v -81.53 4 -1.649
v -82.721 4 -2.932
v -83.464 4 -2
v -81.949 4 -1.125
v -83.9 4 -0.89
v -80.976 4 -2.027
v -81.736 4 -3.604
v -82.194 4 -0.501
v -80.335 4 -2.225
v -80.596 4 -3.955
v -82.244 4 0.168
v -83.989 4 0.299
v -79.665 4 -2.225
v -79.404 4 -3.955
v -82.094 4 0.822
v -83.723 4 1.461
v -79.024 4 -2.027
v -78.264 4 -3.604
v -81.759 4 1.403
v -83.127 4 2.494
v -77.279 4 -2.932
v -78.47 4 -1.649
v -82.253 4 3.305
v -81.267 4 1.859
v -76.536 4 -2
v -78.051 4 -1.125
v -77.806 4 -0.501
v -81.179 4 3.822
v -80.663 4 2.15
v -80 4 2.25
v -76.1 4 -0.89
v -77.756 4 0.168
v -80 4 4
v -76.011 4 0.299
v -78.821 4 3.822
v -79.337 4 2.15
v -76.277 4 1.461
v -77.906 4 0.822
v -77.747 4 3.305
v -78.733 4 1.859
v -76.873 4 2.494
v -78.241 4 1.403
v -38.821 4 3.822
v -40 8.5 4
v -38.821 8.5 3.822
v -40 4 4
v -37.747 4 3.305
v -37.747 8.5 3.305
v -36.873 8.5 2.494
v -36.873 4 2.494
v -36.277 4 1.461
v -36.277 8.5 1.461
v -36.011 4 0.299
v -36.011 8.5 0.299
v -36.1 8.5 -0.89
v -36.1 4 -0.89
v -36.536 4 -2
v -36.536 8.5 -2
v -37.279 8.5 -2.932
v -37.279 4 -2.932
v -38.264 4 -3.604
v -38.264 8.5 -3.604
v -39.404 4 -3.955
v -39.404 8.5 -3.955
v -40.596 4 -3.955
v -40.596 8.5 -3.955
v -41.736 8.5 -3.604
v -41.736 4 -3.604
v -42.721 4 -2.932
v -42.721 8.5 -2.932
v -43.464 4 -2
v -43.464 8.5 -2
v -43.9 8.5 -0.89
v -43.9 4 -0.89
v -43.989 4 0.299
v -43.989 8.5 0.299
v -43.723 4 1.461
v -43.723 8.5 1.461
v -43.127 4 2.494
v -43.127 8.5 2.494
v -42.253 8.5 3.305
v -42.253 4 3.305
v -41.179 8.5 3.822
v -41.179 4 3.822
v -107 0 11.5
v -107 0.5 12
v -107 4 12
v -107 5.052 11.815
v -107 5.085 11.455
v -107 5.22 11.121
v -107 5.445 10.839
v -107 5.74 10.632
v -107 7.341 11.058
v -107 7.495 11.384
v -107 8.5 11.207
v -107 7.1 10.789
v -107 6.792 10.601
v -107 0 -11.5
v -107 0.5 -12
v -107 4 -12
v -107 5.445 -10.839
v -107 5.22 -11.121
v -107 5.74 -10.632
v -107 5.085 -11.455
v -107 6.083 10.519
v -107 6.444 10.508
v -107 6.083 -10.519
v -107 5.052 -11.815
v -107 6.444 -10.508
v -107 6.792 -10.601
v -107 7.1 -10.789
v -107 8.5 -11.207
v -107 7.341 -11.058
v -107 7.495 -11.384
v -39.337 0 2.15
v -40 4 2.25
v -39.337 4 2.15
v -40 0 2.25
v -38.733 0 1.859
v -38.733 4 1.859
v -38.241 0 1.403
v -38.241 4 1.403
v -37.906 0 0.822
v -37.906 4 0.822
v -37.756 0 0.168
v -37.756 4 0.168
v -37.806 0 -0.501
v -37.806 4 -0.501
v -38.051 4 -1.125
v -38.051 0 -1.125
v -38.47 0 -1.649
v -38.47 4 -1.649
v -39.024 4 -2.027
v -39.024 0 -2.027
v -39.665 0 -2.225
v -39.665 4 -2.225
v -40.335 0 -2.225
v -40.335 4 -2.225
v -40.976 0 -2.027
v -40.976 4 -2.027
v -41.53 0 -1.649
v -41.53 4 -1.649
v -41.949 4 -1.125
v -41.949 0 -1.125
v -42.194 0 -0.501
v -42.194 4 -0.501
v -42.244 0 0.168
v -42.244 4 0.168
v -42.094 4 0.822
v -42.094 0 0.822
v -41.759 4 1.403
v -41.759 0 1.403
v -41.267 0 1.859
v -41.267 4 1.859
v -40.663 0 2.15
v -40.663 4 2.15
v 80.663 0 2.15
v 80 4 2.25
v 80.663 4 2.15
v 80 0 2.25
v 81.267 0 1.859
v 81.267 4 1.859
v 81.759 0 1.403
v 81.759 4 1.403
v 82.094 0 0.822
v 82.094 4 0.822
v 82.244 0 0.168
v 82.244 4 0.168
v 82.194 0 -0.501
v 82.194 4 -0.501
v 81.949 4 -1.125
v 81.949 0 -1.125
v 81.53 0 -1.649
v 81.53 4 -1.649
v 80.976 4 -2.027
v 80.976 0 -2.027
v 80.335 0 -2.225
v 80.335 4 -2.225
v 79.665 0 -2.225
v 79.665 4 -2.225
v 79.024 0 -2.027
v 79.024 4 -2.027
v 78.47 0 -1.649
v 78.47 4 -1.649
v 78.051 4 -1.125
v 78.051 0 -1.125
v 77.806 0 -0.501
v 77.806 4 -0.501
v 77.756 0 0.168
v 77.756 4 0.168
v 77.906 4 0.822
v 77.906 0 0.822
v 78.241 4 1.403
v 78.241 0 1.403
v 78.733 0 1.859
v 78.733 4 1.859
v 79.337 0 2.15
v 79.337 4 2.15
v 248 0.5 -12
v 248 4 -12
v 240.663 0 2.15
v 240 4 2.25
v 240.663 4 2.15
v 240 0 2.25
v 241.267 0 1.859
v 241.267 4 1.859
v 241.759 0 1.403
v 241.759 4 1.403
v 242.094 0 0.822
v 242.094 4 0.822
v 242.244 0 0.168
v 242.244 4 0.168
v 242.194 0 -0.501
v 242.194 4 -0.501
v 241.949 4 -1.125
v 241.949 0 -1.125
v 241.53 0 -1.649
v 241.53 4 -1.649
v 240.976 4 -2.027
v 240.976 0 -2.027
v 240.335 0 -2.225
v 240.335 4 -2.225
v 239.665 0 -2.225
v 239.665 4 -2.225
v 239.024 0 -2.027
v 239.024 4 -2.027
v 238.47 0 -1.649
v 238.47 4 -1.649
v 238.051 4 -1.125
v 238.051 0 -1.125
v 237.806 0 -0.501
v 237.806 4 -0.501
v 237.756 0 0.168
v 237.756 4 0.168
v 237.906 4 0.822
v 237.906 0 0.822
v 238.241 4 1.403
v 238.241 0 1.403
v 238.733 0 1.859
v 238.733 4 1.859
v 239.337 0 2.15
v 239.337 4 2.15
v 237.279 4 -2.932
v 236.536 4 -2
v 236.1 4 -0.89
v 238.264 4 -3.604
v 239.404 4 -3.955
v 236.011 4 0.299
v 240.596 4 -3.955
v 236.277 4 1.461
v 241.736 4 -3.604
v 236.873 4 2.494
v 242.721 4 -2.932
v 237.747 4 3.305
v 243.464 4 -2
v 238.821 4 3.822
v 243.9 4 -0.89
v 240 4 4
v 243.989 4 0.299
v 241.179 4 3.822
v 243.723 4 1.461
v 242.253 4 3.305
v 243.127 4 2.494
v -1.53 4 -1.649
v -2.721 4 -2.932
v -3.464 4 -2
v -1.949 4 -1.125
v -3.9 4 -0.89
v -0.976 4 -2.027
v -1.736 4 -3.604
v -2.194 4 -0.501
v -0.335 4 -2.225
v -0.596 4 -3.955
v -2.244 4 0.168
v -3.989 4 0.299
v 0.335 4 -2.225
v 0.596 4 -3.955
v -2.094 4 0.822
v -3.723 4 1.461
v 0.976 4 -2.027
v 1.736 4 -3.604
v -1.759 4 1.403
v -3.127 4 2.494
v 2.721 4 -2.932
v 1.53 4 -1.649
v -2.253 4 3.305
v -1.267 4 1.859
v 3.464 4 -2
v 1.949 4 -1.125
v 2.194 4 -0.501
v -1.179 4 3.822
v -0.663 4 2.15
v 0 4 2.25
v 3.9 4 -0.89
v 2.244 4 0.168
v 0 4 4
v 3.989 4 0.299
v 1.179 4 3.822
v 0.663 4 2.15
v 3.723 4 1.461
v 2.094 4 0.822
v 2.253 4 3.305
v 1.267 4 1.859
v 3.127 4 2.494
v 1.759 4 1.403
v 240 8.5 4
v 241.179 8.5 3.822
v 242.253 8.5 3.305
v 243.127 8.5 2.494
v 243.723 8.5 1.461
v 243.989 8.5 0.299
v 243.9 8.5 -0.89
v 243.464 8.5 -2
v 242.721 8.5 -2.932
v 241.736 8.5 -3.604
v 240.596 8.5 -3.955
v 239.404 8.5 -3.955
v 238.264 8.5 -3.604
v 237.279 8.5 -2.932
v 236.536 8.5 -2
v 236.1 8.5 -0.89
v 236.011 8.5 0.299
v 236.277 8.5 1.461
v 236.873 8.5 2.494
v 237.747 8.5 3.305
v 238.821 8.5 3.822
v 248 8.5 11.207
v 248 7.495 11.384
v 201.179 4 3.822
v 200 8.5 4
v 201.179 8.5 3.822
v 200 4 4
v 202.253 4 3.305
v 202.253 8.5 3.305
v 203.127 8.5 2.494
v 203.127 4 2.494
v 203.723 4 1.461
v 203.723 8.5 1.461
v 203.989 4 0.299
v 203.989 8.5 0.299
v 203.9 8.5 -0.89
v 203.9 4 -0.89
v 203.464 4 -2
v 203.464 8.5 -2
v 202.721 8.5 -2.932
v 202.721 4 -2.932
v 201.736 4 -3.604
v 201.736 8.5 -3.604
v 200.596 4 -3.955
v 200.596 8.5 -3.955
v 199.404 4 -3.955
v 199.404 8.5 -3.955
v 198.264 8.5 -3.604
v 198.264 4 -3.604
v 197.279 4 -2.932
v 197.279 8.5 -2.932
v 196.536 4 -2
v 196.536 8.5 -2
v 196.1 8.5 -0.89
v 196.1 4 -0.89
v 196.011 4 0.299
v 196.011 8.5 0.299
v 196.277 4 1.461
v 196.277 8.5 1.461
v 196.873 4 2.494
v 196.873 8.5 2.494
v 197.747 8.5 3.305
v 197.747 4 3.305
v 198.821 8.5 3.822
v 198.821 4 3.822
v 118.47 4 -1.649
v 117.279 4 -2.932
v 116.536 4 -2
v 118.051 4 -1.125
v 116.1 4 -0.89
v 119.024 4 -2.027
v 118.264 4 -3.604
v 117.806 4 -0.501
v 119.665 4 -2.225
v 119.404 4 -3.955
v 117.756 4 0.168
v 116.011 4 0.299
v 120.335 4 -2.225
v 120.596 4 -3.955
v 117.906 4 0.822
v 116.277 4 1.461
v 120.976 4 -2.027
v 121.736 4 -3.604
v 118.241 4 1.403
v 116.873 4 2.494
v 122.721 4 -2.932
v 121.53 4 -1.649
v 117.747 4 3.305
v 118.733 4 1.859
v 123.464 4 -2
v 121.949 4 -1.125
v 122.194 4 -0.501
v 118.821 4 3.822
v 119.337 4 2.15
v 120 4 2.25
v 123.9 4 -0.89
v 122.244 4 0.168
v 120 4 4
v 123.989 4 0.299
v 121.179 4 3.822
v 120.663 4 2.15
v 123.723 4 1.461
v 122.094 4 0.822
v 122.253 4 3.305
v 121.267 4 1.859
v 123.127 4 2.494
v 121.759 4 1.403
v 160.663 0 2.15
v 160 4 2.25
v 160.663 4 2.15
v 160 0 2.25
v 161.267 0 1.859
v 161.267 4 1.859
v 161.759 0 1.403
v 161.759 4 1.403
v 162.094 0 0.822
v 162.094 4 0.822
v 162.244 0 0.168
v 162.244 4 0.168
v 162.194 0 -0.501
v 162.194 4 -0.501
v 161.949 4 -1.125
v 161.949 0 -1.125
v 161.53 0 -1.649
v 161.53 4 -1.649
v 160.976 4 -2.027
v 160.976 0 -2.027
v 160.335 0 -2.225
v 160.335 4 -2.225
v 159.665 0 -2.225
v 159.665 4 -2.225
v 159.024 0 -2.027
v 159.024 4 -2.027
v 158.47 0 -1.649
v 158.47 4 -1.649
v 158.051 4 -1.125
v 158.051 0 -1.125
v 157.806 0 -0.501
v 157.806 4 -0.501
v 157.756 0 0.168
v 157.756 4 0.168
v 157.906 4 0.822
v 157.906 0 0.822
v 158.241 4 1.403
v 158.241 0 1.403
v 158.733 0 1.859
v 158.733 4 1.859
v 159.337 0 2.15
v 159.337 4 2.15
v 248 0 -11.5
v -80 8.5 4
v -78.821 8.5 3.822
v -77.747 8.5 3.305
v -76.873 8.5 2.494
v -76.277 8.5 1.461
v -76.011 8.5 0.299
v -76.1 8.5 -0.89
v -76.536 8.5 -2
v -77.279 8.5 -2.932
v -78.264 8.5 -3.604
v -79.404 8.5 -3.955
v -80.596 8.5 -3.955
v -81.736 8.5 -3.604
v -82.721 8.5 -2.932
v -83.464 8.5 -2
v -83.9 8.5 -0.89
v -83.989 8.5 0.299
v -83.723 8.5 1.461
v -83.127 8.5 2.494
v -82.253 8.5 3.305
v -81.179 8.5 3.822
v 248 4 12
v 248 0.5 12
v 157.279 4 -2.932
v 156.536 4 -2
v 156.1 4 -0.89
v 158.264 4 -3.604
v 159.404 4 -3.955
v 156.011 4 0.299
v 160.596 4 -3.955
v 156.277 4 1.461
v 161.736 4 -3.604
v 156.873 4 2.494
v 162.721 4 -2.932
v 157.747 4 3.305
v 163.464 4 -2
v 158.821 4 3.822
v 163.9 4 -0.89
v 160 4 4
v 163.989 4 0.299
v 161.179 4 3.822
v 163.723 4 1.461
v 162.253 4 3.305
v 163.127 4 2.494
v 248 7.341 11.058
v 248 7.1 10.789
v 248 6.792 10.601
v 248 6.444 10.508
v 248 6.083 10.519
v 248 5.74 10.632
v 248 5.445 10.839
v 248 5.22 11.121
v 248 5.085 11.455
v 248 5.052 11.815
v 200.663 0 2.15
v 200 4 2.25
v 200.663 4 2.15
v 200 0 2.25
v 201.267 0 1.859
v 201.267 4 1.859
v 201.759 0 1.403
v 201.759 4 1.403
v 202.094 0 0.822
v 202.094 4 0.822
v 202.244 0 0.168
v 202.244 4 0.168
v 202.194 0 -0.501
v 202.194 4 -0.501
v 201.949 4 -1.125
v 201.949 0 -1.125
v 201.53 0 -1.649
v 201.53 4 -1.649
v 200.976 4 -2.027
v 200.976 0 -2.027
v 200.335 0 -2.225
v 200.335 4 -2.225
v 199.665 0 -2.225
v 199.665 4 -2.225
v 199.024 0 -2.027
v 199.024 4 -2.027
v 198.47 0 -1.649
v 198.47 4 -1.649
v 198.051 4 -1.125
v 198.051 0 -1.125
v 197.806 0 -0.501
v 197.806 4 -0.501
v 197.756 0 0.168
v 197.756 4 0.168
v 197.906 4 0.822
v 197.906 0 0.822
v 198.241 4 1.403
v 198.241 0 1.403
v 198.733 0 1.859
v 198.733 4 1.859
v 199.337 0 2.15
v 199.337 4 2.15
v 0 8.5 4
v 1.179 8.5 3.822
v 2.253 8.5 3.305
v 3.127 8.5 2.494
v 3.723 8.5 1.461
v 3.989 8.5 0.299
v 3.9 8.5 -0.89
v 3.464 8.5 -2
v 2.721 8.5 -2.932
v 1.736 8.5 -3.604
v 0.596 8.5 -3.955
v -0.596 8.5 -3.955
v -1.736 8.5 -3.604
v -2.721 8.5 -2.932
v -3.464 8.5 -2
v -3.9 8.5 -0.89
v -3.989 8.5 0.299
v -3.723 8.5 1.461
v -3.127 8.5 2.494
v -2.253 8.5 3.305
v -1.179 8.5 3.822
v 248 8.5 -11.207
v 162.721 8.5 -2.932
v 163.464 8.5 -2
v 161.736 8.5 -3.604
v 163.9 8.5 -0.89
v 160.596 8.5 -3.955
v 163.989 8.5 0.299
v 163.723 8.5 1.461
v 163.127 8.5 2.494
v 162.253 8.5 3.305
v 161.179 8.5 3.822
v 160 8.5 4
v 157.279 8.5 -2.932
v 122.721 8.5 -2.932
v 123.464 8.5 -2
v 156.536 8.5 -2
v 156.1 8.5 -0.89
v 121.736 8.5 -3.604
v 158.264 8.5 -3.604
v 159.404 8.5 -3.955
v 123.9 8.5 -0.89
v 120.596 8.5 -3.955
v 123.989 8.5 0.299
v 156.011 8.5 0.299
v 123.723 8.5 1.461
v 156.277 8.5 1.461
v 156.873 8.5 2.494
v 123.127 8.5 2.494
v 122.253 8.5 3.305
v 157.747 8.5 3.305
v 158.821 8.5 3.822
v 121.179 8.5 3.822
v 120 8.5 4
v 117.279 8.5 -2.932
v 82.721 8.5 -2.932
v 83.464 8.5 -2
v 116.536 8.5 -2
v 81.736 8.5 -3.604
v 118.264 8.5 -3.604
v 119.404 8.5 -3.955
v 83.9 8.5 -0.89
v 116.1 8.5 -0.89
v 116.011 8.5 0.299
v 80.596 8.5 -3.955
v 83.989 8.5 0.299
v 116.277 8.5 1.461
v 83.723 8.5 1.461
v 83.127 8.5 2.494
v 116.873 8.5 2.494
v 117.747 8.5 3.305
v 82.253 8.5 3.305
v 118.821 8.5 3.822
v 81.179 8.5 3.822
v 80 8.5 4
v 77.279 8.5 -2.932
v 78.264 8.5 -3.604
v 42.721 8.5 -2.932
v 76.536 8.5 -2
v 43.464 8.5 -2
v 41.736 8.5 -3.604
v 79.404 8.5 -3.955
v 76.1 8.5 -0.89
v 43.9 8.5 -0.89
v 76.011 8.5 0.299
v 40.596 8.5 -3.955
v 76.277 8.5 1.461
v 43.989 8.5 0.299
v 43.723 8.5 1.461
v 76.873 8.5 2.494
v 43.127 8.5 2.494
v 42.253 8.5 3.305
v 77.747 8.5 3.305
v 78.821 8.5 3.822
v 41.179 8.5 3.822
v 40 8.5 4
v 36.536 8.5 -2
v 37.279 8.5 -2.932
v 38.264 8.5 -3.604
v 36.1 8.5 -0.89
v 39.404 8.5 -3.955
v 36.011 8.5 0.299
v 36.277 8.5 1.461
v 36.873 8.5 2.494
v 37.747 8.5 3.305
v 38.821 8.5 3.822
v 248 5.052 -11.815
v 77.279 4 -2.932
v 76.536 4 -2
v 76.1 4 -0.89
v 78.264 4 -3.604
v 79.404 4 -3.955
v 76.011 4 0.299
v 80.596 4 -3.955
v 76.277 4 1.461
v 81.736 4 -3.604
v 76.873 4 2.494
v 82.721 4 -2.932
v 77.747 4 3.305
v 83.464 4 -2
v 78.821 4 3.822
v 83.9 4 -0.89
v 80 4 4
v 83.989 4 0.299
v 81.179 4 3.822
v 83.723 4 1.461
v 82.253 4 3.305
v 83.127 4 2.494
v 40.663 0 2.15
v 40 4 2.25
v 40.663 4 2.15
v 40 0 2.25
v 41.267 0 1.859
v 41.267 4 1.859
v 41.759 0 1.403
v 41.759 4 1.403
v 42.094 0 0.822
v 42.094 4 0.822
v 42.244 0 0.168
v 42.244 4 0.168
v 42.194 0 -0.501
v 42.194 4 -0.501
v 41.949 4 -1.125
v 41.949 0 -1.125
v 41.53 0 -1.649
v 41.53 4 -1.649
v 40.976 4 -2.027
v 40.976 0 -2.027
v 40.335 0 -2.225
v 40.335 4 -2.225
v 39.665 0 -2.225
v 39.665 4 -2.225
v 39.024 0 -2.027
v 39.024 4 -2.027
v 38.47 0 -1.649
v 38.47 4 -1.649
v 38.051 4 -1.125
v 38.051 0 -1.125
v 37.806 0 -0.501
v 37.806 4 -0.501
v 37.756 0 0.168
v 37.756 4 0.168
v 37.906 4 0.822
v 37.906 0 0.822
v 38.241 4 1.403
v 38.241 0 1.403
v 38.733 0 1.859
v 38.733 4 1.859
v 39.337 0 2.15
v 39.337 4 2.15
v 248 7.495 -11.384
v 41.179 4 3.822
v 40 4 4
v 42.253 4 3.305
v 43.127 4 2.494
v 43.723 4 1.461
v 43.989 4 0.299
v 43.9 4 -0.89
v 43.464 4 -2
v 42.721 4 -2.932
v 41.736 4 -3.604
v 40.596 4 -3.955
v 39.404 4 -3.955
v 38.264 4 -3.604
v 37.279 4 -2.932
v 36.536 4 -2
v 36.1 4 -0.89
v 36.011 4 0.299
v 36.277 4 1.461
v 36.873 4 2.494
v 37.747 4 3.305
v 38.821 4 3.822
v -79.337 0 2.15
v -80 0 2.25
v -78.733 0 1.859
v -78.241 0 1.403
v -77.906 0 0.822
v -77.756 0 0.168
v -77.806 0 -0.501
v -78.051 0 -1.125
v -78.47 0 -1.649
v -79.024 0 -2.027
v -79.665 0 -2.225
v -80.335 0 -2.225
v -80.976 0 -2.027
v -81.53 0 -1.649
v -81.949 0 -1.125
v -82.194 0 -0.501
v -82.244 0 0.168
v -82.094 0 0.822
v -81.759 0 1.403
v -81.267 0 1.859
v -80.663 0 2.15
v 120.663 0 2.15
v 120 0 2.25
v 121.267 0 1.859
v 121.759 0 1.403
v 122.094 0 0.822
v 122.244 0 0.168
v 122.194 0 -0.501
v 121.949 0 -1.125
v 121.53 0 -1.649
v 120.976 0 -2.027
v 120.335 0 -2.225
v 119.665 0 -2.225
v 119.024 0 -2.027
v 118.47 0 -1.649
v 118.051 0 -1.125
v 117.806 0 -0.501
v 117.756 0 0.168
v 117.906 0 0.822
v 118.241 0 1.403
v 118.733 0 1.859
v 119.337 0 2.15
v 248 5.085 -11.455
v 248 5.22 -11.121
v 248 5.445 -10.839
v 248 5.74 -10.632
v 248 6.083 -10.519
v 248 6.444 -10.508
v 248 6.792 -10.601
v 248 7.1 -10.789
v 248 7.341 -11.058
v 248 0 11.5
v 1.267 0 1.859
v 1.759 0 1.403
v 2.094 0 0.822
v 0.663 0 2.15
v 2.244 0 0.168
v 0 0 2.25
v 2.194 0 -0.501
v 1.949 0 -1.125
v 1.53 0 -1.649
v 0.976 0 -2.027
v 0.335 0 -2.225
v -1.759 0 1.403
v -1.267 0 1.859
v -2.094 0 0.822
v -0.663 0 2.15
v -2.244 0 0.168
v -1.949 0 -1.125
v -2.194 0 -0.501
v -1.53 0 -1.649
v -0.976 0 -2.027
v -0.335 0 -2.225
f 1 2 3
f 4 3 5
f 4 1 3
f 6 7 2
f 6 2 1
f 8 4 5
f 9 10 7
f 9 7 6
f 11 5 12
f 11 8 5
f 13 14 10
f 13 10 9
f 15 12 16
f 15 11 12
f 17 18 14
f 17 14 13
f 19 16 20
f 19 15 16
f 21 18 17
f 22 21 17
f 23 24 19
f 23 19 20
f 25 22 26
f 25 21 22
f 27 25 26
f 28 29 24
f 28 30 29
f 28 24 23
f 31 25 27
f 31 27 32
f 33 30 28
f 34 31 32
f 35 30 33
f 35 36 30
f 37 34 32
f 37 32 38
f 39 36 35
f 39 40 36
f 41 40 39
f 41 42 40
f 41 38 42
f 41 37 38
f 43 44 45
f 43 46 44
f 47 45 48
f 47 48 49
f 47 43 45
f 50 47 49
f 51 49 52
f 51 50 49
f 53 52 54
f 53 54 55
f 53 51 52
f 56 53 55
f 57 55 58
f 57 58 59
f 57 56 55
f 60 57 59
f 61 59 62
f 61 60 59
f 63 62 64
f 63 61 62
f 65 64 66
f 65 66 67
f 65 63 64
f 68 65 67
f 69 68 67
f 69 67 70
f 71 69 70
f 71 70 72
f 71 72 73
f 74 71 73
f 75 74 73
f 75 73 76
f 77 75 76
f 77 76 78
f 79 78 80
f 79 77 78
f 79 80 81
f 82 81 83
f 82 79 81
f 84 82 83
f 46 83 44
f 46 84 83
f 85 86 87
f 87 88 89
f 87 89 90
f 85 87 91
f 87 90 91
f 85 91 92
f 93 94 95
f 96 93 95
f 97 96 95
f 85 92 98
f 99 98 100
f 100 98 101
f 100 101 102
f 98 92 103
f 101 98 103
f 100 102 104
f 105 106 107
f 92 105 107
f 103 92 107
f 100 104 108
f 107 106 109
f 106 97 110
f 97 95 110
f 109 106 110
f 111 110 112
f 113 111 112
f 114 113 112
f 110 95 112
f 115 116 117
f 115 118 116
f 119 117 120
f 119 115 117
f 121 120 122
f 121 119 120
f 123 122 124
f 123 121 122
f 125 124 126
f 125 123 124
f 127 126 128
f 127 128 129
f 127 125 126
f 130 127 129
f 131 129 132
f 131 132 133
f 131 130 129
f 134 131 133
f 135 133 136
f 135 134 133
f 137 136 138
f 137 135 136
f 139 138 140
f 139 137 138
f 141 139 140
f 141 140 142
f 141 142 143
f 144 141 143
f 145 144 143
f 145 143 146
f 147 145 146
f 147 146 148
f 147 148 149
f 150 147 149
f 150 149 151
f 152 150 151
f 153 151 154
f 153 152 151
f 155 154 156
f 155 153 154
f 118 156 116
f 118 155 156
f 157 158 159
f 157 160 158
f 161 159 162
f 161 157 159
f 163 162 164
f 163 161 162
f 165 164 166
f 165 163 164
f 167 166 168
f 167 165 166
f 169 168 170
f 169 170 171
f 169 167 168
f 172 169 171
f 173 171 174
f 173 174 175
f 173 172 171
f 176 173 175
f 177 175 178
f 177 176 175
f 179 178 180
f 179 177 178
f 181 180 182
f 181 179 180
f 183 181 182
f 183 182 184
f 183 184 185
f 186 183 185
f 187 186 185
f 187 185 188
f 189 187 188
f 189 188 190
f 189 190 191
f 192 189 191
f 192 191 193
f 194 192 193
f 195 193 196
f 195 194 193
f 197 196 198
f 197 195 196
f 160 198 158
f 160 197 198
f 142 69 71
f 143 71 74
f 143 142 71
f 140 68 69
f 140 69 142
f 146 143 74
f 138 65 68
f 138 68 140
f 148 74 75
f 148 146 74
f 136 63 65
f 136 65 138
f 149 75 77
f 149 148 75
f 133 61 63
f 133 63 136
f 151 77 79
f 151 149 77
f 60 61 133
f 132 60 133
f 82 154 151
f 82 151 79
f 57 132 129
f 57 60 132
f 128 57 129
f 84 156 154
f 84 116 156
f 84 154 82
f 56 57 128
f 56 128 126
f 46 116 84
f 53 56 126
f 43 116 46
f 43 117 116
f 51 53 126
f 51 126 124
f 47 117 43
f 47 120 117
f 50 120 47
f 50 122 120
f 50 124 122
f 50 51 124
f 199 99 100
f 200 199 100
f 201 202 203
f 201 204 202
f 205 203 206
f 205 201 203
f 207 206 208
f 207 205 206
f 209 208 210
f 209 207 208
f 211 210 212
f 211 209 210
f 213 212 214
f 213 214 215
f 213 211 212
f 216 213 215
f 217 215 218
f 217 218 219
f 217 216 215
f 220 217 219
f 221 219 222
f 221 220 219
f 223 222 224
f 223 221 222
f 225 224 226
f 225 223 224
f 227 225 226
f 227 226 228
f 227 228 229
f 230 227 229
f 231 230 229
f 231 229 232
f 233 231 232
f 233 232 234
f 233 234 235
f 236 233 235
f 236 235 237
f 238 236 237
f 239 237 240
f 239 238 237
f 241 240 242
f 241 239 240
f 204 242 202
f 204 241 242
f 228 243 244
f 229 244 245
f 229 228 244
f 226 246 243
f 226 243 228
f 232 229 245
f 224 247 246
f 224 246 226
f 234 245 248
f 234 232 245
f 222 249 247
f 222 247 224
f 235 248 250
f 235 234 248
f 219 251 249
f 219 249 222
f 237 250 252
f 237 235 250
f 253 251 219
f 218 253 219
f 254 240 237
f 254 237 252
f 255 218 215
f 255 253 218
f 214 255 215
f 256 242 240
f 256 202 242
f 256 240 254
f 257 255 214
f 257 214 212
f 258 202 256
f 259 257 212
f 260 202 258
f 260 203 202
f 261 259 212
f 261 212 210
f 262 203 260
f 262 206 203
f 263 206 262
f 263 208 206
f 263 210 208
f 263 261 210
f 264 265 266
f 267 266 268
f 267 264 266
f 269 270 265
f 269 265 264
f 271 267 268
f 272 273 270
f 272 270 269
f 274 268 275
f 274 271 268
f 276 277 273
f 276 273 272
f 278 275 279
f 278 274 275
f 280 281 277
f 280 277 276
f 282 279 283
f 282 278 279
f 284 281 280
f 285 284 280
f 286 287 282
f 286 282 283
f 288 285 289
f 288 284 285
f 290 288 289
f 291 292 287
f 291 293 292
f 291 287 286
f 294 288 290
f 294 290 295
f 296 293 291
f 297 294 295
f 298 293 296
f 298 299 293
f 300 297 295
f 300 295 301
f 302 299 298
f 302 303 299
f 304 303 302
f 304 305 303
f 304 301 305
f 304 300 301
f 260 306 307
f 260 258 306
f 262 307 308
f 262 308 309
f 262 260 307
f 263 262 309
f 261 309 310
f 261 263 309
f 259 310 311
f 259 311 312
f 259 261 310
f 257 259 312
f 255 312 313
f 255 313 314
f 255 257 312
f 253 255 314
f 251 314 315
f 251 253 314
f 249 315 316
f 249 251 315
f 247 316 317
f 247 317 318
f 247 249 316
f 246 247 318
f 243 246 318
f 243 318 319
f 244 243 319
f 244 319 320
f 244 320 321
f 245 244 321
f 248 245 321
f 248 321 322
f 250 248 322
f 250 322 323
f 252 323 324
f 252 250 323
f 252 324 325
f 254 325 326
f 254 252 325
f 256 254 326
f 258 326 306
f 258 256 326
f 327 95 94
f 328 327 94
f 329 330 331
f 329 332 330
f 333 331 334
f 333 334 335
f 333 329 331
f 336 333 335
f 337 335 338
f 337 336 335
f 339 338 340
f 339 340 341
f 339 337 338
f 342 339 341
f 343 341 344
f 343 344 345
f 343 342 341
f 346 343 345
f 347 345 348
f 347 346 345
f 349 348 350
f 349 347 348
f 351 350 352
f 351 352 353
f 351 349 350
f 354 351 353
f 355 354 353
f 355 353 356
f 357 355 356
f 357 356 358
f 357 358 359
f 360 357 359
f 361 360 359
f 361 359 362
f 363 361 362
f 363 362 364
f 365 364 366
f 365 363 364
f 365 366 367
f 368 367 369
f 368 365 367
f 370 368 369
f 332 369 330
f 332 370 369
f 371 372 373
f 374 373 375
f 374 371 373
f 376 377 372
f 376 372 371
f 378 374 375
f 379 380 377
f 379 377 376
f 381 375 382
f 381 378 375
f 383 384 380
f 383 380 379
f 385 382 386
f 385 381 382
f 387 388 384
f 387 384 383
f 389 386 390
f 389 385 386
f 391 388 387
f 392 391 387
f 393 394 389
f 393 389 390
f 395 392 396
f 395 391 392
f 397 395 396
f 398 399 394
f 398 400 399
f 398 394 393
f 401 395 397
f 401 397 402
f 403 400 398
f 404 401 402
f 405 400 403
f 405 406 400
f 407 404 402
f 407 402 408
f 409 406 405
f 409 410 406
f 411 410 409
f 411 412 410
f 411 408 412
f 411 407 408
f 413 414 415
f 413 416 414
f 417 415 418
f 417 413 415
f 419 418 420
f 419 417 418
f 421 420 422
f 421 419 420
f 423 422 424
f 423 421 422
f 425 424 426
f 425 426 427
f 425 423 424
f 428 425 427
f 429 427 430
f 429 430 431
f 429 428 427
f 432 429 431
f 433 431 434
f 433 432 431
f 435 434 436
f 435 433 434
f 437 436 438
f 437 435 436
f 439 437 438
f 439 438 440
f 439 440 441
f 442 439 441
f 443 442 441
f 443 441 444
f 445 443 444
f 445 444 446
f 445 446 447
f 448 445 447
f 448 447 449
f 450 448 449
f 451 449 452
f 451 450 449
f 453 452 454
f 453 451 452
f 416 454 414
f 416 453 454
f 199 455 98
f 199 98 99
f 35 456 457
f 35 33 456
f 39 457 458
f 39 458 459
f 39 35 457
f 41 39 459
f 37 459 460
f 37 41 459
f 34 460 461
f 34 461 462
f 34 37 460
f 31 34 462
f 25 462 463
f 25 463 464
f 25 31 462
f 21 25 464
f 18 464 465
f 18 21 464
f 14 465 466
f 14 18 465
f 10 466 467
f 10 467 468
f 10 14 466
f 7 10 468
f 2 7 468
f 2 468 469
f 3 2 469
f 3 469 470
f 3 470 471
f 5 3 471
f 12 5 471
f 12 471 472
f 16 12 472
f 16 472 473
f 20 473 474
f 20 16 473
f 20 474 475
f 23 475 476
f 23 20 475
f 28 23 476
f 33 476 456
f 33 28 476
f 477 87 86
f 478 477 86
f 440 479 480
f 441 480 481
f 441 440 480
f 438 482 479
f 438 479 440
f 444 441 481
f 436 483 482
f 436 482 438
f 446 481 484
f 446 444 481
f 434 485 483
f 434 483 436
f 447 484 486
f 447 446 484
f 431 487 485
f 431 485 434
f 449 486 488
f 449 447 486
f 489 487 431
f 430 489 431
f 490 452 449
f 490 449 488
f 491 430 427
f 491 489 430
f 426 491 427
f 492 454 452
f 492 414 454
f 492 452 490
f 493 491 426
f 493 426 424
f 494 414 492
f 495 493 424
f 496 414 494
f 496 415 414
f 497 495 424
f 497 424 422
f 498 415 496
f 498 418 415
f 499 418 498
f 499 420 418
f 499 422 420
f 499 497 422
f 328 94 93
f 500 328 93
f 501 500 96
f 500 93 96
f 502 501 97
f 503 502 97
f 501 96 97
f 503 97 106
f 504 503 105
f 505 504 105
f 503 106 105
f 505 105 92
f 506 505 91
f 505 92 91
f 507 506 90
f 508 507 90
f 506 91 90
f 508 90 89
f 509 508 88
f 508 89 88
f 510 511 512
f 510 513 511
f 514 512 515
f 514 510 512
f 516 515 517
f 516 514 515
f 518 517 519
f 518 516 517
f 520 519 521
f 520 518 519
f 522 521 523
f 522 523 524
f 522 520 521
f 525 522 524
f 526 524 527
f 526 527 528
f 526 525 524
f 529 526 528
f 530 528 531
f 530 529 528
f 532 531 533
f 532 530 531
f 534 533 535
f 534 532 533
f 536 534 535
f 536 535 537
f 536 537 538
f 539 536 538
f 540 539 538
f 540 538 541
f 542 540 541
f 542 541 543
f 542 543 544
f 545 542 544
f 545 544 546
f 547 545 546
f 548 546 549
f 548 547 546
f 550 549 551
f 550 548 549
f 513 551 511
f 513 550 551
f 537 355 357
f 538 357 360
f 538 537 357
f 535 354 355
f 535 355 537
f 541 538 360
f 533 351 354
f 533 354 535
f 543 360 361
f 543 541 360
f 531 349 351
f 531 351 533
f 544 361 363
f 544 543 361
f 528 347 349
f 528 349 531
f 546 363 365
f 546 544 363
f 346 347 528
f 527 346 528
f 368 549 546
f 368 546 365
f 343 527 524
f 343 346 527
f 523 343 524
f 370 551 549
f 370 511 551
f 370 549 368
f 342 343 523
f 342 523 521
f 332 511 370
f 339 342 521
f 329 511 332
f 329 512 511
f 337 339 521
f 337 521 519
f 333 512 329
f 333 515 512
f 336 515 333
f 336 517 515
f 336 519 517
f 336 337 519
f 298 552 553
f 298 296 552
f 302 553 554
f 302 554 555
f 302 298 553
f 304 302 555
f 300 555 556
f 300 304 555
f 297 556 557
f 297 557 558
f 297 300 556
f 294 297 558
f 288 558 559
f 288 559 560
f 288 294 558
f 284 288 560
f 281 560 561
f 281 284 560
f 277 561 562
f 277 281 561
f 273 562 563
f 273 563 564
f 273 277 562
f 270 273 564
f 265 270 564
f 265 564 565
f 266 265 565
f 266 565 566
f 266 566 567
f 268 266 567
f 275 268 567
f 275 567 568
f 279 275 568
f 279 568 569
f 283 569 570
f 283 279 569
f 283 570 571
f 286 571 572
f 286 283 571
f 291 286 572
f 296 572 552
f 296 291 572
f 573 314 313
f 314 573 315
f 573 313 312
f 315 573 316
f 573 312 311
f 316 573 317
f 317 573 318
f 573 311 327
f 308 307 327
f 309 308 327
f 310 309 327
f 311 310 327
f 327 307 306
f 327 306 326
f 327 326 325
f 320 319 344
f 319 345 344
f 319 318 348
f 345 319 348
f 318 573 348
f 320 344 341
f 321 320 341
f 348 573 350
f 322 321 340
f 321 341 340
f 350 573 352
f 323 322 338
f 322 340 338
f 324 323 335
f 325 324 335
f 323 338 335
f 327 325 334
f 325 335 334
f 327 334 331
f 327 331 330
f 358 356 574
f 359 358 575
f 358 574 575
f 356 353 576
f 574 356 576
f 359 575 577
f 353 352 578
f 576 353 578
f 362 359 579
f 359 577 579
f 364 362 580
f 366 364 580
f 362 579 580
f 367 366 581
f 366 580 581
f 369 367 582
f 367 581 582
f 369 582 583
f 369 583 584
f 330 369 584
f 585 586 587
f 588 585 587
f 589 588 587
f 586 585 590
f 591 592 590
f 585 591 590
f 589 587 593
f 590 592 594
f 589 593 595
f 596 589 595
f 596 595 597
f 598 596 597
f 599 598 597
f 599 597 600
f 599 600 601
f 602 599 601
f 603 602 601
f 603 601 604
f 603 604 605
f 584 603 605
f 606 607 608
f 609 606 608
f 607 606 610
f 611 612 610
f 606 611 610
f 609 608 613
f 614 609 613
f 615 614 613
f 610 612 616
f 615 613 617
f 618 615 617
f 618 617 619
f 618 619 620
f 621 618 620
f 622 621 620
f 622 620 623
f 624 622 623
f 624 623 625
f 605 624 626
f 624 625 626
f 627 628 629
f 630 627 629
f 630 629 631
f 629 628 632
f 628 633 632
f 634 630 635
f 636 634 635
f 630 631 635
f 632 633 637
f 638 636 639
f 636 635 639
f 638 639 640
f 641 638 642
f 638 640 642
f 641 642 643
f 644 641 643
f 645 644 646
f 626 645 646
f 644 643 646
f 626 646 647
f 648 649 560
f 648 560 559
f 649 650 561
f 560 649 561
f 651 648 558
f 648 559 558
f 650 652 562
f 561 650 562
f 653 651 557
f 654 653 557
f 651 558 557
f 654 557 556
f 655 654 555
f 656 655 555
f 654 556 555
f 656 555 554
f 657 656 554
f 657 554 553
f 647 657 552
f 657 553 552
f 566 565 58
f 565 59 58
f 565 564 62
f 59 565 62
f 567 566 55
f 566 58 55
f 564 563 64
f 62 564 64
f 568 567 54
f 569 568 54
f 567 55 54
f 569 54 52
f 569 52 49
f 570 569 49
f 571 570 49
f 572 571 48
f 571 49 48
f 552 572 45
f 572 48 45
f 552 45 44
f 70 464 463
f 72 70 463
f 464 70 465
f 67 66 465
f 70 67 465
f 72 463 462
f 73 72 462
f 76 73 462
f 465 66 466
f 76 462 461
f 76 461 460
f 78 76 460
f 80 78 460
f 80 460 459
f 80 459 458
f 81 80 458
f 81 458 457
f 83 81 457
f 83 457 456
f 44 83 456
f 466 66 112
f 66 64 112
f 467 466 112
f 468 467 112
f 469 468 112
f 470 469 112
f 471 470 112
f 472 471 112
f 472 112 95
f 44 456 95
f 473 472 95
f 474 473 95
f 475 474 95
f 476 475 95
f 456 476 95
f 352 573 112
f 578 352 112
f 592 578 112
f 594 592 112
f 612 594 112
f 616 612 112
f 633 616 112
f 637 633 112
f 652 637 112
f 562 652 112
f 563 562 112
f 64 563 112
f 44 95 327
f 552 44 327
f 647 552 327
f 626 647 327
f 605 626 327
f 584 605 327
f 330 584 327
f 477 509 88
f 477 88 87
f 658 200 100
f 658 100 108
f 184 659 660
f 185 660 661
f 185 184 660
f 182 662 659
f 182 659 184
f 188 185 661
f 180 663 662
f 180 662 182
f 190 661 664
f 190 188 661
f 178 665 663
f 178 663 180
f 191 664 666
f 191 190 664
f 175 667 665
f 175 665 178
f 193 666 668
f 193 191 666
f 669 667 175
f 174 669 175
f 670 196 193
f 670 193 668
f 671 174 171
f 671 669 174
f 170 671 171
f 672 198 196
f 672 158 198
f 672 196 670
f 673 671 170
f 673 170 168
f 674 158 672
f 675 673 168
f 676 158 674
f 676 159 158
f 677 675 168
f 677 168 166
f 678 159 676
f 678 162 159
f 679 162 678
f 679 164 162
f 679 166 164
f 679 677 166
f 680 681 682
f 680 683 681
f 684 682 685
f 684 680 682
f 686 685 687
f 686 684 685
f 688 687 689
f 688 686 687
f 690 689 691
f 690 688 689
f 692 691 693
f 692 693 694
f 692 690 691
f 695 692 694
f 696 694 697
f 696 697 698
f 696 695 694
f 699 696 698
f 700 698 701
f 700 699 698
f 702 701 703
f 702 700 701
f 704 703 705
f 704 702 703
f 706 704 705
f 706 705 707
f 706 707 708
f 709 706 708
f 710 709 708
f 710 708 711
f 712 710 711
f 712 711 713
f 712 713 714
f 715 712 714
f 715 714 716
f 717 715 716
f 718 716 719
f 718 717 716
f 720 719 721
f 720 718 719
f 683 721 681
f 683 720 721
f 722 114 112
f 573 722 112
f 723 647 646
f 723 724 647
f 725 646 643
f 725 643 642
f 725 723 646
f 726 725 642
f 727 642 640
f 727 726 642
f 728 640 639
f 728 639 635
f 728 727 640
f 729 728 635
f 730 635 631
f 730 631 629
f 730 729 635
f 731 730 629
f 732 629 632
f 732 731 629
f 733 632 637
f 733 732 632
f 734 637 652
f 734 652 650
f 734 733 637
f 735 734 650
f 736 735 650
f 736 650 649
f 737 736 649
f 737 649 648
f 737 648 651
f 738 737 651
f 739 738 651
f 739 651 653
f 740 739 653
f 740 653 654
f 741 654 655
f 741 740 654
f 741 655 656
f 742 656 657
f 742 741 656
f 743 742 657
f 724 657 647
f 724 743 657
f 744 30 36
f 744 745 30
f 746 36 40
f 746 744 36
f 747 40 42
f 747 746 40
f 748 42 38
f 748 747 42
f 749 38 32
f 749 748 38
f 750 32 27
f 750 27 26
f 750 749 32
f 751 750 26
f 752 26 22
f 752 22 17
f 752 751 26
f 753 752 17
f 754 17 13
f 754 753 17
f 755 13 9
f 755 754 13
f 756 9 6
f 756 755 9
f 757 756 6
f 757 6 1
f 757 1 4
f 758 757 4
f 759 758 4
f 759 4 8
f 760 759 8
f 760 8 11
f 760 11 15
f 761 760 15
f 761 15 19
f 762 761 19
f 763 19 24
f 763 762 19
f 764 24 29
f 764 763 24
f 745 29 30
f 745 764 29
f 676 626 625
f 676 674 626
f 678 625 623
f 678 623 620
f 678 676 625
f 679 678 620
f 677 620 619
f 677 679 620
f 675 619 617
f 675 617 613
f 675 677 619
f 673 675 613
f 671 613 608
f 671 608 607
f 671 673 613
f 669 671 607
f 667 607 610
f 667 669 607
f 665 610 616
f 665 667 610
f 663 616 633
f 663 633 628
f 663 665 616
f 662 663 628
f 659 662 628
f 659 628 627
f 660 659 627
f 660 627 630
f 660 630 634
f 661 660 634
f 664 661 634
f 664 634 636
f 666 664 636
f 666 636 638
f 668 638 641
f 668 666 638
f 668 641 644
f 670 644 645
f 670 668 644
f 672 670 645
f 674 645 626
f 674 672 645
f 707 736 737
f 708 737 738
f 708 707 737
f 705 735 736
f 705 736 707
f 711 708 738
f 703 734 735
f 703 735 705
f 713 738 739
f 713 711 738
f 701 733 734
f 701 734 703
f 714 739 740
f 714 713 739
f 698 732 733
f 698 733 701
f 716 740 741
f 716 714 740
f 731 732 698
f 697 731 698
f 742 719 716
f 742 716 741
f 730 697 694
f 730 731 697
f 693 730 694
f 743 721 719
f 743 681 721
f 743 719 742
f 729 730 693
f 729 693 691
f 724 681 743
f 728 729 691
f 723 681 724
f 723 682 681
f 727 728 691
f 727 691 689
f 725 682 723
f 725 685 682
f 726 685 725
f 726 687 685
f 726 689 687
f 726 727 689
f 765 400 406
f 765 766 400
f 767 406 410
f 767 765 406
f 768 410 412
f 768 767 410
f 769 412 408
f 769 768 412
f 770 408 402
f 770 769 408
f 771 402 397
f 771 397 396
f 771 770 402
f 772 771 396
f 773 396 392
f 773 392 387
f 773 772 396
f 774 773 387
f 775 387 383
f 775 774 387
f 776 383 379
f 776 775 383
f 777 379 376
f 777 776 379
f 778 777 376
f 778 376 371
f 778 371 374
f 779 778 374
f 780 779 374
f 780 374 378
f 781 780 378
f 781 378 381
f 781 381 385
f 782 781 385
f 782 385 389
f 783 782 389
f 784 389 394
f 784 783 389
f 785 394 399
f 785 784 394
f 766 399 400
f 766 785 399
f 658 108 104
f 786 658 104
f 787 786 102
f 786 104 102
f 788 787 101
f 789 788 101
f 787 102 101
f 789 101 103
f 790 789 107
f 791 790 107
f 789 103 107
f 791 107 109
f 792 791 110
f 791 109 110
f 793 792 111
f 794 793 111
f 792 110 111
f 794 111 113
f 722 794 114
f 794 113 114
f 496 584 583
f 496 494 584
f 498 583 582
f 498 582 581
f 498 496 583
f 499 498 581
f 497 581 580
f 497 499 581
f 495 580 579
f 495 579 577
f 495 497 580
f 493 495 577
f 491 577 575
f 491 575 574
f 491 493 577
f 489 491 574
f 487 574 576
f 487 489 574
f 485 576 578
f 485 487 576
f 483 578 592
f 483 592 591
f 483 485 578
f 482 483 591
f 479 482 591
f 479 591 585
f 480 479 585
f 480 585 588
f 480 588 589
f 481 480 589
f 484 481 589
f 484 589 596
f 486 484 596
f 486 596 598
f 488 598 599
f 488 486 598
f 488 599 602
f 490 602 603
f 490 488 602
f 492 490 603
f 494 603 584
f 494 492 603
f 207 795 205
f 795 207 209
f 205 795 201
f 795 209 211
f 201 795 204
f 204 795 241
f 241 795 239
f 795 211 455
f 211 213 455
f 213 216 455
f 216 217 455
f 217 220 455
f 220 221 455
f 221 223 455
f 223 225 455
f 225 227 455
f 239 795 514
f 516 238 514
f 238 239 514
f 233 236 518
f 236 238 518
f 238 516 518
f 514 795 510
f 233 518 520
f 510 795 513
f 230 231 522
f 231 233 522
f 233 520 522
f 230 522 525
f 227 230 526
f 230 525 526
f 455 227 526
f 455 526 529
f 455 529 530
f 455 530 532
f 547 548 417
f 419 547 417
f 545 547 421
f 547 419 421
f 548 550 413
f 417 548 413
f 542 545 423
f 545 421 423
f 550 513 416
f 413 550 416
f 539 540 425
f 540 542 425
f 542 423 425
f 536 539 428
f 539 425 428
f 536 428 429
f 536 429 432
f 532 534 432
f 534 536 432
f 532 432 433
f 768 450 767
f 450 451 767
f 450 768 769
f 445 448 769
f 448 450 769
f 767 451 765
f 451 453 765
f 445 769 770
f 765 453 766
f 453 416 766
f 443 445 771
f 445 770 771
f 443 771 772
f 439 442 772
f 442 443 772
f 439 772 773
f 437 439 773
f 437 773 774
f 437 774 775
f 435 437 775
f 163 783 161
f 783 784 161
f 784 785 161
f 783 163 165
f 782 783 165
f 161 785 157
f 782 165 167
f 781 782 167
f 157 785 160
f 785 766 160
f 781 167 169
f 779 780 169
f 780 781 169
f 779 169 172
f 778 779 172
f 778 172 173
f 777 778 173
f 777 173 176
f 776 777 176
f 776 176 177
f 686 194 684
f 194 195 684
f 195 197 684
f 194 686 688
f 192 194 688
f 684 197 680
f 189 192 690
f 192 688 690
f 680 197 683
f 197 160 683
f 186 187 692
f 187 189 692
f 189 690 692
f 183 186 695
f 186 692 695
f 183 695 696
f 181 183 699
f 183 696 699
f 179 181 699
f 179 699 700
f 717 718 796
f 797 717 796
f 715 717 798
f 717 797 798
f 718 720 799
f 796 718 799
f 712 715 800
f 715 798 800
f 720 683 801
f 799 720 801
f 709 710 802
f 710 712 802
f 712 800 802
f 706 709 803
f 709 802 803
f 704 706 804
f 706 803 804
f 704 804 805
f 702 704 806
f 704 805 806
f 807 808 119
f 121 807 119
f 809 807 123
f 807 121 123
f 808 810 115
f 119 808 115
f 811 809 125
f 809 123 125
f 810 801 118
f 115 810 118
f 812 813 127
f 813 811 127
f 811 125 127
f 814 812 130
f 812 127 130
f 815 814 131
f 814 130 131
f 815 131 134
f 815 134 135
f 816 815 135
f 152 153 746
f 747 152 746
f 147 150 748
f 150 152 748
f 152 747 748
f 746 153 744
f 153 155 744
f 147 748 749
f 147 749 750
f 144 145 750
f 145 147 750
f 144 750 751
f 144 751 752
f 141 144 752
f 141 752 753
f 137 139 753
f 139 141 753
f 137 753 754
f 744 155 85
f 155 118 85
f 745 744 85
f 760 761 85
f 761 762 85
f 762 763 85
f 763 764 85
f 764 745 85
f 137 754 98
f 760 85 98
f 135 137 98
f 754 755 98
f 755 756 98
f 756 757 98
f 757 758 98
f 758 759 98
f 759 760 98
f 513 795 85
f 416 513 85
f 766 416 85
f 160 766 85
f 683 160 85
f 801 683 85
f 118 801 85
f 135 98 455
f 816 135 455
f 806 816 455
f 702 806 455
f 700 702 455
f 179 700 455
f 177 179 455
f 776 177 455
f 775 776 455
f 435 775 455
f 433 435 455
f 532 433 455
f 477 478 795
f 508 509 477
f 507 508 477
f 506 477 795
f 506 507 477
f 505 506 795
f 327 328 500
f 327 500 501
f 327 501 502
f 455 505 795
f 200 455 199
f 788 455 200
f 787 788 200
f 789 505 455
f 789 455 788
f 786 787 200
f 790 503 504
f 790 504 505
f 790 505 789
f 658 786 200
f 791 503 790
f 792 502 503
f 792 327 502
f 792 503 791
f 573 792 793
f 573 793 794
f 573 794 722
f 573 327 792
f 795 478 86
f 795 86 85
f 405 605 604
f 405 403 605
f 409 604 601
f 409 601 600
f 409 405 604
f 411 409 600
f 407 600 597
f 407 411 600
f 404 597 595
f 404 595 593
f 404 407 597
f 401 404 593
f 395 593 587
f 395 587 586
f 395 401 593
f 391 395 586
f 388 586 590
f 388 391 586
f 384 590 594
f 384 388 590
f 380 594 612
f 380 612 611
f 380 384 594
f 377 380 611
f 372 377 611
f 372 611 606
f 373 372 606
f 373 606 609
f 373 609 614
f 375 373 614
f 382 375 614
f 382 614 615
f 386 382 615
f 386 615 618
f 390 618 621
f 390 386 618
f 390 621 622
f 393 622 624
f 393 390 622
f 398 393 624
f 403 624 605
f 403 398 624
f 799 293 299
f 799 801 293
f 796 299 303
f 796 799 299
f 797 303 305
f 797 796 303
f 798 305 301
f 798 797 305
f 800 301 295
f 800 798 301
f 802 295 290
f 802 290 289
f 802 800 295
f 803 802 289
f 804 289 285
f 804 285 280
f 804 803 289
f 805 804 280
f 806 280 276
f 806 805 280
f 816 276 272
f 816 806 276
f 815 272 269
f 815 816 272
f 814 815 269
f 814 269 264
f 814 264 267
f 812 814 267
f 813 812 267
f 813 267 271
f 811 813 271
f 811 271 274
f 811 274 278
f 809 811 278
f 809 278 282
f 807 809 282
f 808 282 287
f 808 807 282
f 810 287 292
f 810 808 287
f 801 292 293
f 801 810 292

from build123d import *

# Parameters (mm, degrees)
RESSALTO_EXTRUS_O1_DEPTH      = 263
RESSALTO_EXTRUS_O1_DEPTH_BACK = 92
LPATTERN1_COUNT               = 6
LPATTERN1_PITCH               = 40
LPATTERN1_COL_COUNT           = 4
LPATTERN1_COL_PITCH           = 40


with BuildPart() as part:
    # Esboço1 → Ressalto-extrusão1 (new, two sides: drawn at the far end of the back side and taken through both)
    with BuildSketch(Plane(origin=(-15, 0, 0), x_dir=(0, 0, -1), z_dir=(1, 0, 0)).offset(-RESSALTO_EXTRUS_O1_DEPTH_BACK)):
        with BuildLine():
            Line((-12, 4), (-12, 0.5))
            Line((-12, 0.5), (-11.5, 0))
            Line((-11.5, 0), (11.5, 0))
            Line((11.5, 0), (12, 0.5))
            Line((12, 0.5), (12, 4))
            Line((12, 4), (11.814562479, 5.051668439))
            ThreePointArc((11.814562479, 5.051668439), (10.518990309, 6.082939778), (11.383714346, 7.495129625))
            Line((11.383714346, 7.495129625), (11.206528587, 8.5))
            Line((11.206528587, 8.5), (-11.206528587, 8.5))
            Line((-11.206528587, 8.5), (-11.383714346, 7.495129625))
            ThreePointArc((-11.383714346, 7.495129625), (-10.518990309, 6.082939778), (-11.814562479, 5.051668439))
            Line((-11.814562479, 5.051668439), (-12, 4))
        make_face()
    extrude(amount=RESSALTO_EXTRUS_O1_DEPTH + RESSALTO_EXTRUS_O1_DEPTH_BACK)

    # Esboço3 → Corte-Revolução2 (revolve, cut)
    with BuildSketch(Plane.XY, mode=Mode.PRIVATE) as corte_revolu_o2_sk:
        Polygon((40, 8.5), (44, 8.5), (44, 4), (42.25, 4), (42.25, 0), (40, 0), align=None)
    corte_revolu_o2 = revolve(corte_revolu_o2_sk.sketch.rotate(Axis((40, 0, 0), (0, 1, 0)), 270), axis=Axis((40, 0, 0), (0, 1, 0)), mode=Mode.SUBTRACT)

    # LPattern1: Corte-Revolução2 ×6
    with Locations(*[(i * LPATTERN1_PITCH, 0, 0) for i in range(1, LPATTERN1_COUNT)]):
        add(corte_revolu_o2, mode=Mode.SUBTRACT)

    # LPattern1 col: Corte-Revolução2 ×4
    with Locations(*[(-i * LPATTERN1_COL_PITCH, 0, 0) for i in range(1, LPATTERN1_COL_COUNT)]):
        add(corte_revolu_o2, mode=Mode.SUBTRACT)


solid = part.part
